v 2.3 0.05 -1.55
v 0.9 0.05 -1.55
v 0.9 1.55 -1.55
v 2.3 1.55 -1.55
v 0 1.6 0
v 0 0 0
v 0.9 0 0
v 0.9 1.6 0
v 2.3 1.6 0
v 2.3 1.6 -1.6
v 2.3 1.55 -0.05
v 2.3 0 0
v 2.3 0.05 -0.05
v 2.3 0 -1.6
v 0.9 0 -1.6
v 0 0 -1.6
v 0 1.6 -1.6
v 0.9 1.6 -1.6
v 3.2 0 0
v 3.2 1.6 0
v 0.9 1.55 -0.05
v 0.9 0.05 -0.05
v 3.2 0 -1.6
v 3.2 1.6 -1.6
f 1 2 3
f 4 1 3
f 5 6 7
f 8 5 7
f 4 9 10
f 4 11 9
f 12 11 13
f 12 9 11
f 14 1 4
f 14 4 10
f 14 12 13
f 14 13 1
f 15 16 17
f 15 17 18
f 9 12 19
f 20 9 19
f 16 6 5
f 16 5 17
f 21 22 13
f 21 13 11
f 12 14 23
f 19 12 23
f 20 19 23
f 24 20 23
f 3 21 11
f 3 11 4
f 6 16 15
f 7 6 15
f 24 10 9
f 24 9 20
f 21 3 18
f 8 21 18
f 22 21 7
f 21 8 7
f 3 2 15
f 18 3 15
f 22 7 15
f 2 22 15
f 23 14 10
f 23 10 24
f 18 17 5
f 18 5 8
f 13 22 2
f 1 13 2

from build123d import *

# Parameters (mm, degrees)
SKETCH1_W             = 0.9
SKETCH1_H             = 1.6
BOSS_EXTRUDE1_DEPTH   = 1.6
BOSS_EXTRUDE1_2_DEPTH = 1.6
BOSS_EXTRUDE2_REACH   = 5.226
SKETCH2_W             = 1.5
SKETCH2_H             = 1.5


with BuildPart() as part:
    # Sketch1 → Boss-Extrude1 (new body)
    with BuildSketch(Plane(origin=(0, 0, 0), x_dir=(1, 0, 0), z_dir=(0, 1, 0))):
        with Locations((0.45, 0.8)):
            Rectangle(SKETCH1_W, SKETCH1_H)
    extrude(amount=BOSS_EXTRUDE1_DEPTH)


with BuildPart() as body_2:
    # Sketch1 → Boss-Extrude1 2 (new body)
    with BuildSketch(Plane(origin=(0, 0, 0), x_dir=(1, 0, 0), z_dir=(0, 1, 0))):
        with Locations((2.75, 0.8)):
            Rectangle(SKETCH1_W, SKETCH1_H)
    extrude(amount=BOSS_EXTRUDE1_2_DEPTH)

    # Sketch2 → Boss-Extrude2 (add, up to next)
    with BuildSketch(Plane(origin=(0.9, 0, 0), x_dir=(0, 0, -1), z_dir=(1, 0, 0)), mode=Mode.PRIVATE) as boss_extrude2_sk1:
        with Locations((0.8, 0.8)):
            Rectangle(SKETCH2_W, SKETCH2_H)
    boss_extrude2_tool1 = extrude(boss_extrude2_sk1.sketch, amount=BOSS_EXTRUDE2_REACH, mode=Mode.PRIVATE) - body_2.part

    add(part.part)  # Boss-Extrude2 merges part
    add(boss_extrude2_tool1.solids().sort_by_distance((0.9, 0.8, -0.8))[0])


solid = body_2.part
